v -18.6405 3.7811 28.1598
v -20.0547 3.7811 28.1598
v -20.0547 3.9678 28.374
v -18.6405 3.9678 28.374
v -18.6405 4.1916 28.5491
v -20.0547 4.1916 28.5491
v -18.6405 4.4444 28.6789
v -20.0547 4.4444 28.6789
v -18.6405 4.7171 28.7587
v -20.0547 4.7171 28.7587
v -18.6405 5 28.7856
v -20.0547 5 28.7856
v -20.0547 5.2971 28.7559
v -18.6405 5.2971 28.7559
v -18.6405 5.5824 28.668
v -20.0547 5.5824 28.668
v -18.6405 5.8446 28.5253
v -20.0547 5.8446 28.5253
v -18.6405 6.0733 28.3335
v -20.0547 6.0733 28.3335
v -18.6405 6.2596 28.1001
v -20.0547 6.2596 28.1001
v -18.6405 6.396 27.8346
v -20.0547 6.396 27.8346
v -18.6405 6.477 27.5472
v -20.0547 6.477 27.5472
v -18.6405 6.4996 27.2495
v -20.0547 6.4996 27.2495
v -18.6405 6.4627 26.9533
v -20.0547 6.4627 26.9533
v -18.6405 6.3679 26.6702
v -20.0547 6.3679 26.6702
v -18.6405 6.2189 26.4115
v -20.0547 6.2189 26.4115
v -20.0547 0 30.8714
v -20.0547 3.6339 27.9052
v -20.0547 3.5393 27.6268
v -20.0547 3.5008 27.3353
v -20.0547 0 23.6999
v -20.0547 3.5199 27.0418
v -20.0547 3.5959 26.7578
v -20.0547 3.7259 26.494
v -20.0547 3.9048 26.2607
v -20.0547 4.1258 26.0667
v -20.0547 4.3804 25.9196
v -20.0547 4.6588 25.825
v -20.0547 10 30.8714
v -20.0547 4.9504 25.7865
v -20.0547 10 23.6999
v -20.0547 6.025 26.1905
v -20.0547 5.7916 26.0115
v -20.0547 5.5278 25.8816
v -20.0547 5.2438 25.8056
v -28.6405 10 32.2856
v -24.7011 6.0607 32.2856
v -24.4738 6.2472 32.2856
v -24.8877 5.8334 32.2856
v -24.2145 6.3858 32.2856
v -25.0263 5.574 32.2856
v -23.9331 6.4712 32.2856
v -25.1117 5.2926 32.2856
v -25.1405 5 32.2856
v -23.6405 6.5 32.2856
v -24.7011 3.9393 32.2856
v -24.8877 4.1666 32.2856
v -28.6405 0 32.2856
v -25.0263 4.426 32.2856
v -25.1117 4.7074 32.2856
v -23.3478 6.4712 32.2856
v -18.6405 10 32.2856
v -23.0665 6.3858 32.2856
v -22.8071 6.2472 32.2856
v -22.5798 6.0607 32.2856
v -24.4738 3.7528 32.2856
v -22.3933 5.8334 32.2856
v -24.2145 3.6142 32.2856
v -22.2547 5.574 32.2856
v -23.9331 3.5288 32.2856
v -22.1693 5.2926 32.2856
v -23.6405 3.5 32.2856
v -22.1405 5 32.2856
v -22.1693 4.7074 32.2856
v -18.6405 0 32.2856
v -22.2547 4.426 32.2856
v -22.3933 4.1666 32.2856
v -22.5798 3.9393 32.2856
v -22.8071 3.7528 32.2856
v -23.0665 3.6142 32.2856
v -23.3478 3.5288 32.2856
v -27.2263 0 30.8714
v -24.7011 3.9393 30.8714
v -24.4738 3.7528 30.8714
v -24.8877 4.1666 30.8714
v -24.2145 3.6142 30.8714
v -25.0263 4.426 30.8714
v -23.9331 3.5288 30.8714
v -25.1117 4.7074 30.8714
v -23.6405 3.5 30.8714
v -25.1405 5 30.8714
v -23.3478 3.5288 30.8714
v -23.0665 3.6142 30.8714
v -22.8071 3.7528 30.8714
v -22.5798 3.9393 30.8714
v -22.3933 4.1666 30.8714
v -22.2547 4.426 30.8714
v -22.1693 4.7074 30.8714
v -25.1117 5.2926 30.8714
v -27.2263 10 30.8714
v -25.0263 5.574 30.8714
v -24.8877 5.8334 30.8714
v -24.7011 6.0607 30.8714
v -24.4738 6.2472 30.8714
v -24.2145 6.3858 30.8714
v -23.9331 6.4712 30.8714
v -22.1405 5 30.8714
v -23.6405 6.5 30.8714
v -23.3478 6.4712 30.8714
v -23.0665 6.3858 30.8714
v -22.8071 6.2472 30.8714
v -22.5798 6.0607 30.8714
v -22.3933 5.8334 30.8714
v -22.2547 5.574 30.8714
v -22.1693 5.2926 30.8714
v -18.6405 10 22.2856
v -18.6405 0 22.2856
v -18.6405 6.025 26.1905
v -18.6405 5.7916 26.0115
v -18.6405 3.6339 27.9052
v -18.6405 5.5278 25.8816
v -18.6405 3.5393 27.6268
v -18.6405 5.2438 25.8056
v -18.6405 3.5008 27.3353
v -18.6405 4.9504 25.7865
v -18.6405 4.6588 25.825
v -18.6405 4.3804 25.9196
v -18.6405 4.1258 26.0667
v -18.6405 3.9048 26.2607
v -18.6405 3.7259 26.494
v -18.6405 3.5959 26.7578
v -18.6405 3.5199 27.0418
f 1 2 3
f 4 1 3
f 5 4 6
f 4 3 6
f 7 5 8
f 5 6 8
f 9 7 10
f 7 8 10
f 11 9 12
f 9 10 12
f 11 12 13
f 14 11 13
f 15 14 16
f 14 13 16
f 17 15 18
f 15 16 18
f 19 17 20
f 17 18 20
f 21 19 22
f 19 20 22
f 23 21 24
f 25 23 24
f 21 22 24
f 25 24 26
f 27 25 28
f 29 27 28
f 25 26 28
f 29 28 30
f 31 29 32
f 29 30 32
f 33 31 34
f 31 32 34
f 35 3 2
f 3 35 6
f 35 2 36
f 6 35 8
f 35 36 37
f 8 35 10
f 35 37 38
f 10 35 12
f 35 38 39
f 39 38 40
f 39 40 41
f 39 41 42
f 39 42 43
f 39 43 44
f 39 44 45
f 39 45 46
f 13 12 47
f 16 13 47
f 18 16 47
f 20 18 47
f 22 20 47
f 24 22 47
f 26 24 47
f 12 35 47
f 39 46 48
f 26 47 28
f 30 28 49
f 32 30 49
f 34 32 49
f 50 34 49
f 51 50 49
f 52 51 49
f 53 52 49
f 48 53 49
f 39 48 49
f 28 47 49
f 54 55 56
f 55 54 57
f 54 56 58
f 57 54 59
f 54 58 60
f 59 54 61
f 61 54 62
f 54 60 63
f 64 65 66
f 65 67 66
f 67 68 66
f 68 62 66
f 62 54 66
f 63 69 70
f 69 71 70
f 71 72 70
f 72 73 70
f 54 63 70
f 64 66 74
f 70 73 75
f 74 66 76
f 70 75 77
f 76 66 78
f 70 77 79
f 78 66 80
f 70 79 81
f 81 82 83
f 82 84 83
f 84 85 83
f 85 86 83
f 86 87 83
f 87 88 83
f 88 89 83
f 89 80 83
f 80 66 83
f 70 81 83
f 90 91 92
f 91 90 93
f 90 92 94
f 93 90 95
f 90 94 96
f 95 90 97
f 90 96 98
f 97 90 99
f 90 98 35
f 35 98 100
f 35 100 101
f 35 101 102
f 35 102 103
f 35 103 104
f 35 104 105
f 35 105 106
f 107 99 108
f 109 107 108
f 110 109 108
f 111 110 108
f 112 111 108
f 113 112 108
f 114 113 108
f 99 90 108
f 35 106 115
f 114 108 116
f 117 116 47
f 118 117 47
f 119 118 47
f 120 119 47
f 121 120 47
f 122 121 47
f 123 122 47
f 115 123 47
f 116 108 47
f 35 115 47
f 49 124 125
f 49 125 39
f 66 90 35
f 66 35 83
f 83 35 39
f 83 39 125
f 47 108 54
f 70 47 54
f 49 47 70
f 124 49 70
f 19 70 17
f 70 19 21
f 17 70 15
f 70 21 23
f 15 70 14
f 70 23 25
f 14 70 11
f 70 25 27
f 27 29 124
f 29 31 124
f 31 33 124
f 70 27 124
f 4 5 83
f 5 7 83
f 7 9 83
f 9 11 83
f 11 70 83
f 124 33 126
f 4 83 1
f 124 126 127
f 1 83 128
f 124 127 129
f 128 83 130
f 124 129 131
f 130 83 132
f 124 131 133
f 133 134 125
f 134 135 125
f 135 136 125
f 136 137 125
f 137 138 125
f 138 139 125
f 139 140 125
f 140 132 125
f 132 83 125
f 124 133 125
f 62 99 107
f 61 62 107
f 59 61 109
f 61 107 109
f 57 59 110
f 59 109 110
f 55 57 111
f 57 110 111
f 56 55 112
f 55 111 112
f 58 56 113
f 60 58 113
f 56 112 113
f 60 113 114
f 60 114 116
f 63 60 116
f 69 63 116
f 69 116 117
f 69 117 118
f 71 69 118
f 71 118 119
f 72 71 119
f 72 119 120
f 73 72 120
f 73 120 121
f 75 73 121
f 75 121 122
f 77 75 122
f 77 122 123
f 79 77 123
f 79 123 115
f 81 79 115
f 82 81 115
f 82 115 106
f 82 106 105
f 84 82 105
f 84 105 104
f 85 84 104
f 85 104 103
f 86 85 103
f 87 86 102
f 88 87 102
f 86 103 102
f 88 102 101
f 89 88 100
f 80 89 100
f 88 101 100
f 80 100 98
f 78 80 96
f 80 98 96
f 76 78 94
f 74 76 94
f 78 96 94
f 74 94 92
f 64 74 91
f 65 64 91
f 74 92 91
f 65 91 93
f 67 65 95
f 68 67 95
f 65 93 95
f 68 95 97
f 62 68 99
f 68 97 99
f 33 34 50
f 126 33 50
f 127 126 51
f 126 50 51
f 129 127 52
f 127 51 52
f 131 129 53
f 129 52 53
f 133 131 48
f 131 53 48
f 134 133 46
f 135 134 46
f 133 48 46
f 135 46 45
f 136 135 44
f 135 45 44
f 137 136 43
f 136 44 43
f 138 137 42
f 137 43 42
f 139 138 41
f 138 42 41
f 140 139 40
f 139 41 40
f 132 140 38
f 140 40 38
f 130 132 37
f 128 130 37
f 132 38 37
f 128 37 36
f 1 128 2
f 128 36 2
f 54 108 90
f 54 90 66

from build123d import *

# Parameters (mm, degrees)
IZIM1_W                     = 10
IZIM1_H                     = 10
Y_KSEKLIK_EKSTR_ZYON1_DEPTH = 10
KES_EKSTR_ZYON1_DEPTH       = 10
IZIM3_W                     = 9.22702718
IZIM3_H                     = 8.892036637
KES_EKSTR_ZYON2_DEPTH       = 10
KES_EKSTR_ZYON3_DEPTH       = 10
IZIM6_R                     = 1.5
KES_EKSTR_ZYON4_DEPTH       = 10


with BuildPart() as part:
    # Çizim1 → Yükseklik-Ekstrüzyon1 (new body)
    with BuildSketch(Plane(origin=(0, 0, 0), x_dir=(1, 0, 0), z_dir=(0, 1, 0))):
        with Locations((-23.640485452, -27.285638146)):
            Rectangle(IZIM1_W, IZIM1_H)
    extrude(amount=Y_KSEKLIK_EKSTR_ZYON1_DEPTH)

    # Çizim2 → Kes-Ekstrüzyon1 (cut)
    with BuildSketch(Plane(origin=(0, 10, 0), x_dir=(1, 0, 0), z_dir=(0, 1, 0))):
        Polygon((-28.640485452, -22.285638146), (-18.640485452, -22.285638146), (-28.640485452, -32.285638146), align=None)
    extrude(amount=-KES_EKSTR_ZYON1_DEPTH, mode=Mode.SUBTRACT)

    # Çizim3 → Kes-Ekstrüzyon2 (cut)
    with BuildSketch(Plane(origin=(0, 10, 0), x_dir=(1, 0, 0), z_dir=(0, 1, 0))):
        with Locations((-24.668212605, -26.425406266)):
            Rectangle(IZIM3_W, IZIM3_H)
    extrude(amount=-KES_EKSTR_ZYON2_DEPTH, mode=Mode.SUBTRACT)

    # Çizim5 → Kes-Ekstrüzyon3 (cut)
    with BuildSketch(Plane.ZY.offset(20.054699015)):
        with BuildLine():
            ThreePointArc((28.785638146, 5), (27.970743901, 6.334402527), (26.411464673, 6.218942467))
            Line((26.411464673, 6.218942467), (28.15981162, 3.781057533))
            ThreePointArc((28.15981162, 3.781057533), (28.620040674, 4.314894245), (28.785638146, 5))
        make_face()
        with BuildLine():
            Line((28.15981162, 3.781057533), (26.411464673, 6.218942467))
            ThreePointArc((26.411464673, 6.218942467), (26.066695679, 4.125826527), (28.15981162, 3.781057533))
        make_face()
    extrude(amount=-KES_EKSTR_ZYON3_DEPTH, mode=Mode.SUBTRACT)

    # Çizim6 → Kes-Ekstrüzyon4 (cut)
    with BuildSketch(Plane(origin=(0, 0, 30.871424584), x_dir=(-1, 0, 0), z_dir=(0, 0, -1))):
        with Locations((23.640485452, 5)):
            Circle(IZIM6_R)
    extrude(amount=-KES_EKSTR_ZYON4_DEPTH, mode=Mode.SUBTRACT)


solid = part.part
